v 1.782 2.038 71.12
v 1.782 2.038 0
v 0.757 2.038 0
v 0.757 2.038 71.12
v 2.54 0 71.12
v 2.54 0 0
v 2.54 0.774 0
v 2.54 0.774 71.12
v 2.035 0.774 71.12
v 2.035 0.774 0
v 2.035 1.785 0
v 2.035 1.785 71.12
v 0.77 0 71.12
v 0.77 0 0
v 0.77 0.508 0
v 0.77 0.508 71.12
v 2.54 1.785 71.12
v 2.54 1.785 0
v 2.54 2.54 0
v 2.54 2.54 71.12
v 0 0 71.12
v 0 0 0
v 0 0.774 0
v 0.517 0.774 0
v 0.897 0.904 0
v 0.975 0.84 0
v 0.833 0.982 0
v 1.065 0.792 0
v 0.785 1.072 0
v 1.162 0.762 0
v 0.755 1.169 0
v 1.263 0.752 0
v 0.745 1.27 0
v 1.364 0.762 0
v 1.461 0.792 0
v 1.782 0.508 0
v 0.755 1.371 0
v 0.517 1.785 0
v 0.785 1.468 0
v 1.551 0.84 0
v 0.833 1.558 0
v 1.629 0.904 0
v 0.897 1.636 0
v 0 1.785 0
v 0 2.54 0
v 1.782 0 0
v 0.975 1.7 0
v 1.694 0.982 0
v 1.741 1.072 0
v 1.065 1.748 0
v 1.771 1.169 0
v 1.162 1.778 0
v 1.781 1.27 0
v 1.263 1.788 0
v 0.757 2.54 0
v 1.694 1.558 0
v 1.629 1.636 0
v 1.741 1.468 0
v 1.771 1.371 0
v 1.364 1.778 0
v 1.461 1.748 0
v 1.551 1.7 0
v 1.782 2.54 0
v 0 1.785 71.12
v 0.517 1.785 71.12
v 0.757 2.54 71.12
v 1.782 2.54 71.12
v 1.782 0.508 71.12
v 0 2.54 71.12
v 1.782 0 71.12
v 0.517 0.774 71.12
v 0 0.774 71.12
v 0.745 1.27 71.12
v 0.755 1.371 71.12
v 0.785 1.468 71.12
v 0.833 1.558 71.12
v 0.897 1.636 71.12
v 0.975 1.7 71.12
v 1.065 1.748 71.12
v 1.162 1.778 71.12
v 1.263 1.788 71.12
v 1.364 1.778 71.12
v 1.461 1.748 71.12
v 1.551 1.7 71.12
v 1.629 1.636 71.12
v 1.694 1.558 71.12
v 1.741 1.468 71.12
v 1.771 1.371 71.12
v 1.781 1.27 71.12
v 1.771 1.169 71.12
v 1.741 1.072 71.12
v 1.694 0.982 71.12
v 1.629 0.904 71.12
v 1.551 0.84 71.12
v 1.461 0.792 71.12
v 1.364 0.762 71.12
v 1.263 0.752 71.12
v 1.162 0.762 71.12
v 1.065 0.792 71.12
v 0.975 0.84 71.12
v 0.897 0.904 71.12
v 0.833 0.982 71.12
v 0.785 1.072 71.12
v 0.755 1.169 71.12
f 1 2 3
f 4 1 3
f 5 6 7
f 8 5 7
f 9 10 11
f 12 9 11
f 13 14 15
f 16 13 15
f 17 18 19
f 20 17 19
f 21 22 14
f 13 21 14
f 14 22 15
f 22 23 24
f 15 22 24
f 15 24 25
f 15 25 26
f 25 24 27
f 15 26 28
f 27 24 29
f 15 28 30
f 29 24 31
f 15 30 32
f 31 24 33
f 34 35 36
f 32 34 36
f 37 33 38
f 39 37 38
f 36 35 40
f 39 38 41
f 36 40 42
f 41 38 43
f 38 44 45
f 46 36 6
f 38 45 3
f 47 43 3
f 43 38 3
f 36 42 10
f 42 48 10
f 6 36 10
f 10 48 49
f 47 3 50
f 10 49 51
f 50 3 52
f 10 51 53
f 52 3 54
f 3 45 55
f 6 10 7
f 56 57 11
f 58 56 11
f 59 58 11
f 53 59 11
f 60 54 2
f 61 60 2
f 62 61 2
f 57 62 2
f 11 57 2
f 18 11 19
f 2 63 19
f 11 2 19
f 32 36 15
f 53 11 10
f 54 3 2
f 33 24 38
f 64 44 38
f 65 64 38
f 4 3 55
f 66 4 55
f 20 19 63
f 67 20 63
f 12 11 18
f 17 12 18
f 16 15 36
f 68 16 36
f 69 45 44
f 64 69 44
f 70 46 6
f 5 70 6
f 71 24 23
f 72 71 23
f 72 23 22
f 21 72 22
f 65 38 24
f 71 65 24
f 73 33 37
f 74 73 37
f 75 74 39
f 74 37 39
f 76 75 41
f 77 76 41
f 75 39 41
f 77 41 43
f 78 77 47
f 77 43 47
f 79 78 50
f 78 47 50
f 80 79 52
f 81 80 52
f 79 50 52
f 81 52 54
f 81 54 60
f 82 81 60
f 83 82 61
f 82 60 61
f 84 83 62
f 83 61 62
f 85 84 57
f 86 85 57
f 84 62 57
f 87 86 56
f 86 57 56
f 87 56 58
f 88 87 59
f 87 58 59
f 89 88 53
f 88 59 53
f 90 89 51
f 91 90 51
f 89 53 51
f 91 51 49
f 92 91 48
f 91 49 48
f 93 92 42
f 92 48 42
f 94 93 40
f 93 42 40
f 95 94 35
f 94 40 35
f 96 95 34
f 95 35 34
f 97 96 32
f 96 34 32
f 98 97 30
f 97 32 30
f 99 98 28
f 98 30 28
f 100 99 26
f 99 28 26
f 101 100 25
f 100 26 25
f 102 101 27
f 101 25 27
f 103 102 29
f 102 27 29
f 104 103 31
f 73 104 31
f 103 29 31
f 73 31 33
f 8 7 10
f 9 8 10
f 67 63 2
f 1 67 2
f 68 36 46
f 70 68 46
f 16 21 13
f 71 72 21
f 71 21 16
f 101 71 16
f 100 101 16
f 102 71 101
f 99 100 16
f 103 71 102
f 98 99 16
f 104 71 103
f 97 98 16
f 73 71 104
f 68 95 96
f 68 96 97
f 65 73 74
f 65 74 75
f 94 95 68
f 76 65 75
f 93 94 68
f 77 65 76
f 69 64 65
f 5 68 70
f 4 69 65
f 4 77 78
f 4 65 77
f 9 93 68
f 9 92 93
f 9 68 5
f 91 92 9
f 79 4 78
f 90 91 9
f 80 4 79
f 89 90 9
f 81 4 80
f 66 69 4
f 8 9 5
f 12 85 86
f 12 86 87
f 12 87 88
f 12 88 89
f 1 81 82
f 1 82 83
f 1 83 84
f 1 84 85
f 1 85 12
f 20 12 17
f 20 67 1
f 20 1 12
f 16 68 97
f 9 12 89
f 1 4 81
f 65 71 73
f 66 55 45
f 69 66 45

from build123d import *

# Parameters (mm, degrees)
F1_DEPTH = 71.12


with BuildPart() as f1:
    # F0 (on Top) → F1 (new body)
    with BuildSketch(Plane.XY):
        Polygon((0, 0.773533), (0, 0), (0.769862, 0), (0.769862, 0.507953), (1.781597, 0.507953), (1.781597, 0), (2.54, 0), (2.54, 0.773533), (2.03453, 0.773533), (2.03453, 1.785268), (2.54, 1.785268), (2.54, 2.54), (1.781597, 2.54), (1.781597, 2.038202), (0.757215, 2.038202), (0.757215, 2.54), (0, 2.54), (0, 1.785268), (0.516928, 1.785268), (0.516928, 1.27), (0.516928, 0.773533), align=None)
        with BuildLine():
            ThreePointArc((1.780828, 1.27), (1.263083, 0.752255), (0.745338, 1.27))
            ThreePointArc((0.745338, 1.27), (1.263083, 1.787745), (1.780828, 1.27))
        make_face(mode=Mode.SUBTRACT)
    extrude(amount=F1_DEPTH)


solid = f1.part
